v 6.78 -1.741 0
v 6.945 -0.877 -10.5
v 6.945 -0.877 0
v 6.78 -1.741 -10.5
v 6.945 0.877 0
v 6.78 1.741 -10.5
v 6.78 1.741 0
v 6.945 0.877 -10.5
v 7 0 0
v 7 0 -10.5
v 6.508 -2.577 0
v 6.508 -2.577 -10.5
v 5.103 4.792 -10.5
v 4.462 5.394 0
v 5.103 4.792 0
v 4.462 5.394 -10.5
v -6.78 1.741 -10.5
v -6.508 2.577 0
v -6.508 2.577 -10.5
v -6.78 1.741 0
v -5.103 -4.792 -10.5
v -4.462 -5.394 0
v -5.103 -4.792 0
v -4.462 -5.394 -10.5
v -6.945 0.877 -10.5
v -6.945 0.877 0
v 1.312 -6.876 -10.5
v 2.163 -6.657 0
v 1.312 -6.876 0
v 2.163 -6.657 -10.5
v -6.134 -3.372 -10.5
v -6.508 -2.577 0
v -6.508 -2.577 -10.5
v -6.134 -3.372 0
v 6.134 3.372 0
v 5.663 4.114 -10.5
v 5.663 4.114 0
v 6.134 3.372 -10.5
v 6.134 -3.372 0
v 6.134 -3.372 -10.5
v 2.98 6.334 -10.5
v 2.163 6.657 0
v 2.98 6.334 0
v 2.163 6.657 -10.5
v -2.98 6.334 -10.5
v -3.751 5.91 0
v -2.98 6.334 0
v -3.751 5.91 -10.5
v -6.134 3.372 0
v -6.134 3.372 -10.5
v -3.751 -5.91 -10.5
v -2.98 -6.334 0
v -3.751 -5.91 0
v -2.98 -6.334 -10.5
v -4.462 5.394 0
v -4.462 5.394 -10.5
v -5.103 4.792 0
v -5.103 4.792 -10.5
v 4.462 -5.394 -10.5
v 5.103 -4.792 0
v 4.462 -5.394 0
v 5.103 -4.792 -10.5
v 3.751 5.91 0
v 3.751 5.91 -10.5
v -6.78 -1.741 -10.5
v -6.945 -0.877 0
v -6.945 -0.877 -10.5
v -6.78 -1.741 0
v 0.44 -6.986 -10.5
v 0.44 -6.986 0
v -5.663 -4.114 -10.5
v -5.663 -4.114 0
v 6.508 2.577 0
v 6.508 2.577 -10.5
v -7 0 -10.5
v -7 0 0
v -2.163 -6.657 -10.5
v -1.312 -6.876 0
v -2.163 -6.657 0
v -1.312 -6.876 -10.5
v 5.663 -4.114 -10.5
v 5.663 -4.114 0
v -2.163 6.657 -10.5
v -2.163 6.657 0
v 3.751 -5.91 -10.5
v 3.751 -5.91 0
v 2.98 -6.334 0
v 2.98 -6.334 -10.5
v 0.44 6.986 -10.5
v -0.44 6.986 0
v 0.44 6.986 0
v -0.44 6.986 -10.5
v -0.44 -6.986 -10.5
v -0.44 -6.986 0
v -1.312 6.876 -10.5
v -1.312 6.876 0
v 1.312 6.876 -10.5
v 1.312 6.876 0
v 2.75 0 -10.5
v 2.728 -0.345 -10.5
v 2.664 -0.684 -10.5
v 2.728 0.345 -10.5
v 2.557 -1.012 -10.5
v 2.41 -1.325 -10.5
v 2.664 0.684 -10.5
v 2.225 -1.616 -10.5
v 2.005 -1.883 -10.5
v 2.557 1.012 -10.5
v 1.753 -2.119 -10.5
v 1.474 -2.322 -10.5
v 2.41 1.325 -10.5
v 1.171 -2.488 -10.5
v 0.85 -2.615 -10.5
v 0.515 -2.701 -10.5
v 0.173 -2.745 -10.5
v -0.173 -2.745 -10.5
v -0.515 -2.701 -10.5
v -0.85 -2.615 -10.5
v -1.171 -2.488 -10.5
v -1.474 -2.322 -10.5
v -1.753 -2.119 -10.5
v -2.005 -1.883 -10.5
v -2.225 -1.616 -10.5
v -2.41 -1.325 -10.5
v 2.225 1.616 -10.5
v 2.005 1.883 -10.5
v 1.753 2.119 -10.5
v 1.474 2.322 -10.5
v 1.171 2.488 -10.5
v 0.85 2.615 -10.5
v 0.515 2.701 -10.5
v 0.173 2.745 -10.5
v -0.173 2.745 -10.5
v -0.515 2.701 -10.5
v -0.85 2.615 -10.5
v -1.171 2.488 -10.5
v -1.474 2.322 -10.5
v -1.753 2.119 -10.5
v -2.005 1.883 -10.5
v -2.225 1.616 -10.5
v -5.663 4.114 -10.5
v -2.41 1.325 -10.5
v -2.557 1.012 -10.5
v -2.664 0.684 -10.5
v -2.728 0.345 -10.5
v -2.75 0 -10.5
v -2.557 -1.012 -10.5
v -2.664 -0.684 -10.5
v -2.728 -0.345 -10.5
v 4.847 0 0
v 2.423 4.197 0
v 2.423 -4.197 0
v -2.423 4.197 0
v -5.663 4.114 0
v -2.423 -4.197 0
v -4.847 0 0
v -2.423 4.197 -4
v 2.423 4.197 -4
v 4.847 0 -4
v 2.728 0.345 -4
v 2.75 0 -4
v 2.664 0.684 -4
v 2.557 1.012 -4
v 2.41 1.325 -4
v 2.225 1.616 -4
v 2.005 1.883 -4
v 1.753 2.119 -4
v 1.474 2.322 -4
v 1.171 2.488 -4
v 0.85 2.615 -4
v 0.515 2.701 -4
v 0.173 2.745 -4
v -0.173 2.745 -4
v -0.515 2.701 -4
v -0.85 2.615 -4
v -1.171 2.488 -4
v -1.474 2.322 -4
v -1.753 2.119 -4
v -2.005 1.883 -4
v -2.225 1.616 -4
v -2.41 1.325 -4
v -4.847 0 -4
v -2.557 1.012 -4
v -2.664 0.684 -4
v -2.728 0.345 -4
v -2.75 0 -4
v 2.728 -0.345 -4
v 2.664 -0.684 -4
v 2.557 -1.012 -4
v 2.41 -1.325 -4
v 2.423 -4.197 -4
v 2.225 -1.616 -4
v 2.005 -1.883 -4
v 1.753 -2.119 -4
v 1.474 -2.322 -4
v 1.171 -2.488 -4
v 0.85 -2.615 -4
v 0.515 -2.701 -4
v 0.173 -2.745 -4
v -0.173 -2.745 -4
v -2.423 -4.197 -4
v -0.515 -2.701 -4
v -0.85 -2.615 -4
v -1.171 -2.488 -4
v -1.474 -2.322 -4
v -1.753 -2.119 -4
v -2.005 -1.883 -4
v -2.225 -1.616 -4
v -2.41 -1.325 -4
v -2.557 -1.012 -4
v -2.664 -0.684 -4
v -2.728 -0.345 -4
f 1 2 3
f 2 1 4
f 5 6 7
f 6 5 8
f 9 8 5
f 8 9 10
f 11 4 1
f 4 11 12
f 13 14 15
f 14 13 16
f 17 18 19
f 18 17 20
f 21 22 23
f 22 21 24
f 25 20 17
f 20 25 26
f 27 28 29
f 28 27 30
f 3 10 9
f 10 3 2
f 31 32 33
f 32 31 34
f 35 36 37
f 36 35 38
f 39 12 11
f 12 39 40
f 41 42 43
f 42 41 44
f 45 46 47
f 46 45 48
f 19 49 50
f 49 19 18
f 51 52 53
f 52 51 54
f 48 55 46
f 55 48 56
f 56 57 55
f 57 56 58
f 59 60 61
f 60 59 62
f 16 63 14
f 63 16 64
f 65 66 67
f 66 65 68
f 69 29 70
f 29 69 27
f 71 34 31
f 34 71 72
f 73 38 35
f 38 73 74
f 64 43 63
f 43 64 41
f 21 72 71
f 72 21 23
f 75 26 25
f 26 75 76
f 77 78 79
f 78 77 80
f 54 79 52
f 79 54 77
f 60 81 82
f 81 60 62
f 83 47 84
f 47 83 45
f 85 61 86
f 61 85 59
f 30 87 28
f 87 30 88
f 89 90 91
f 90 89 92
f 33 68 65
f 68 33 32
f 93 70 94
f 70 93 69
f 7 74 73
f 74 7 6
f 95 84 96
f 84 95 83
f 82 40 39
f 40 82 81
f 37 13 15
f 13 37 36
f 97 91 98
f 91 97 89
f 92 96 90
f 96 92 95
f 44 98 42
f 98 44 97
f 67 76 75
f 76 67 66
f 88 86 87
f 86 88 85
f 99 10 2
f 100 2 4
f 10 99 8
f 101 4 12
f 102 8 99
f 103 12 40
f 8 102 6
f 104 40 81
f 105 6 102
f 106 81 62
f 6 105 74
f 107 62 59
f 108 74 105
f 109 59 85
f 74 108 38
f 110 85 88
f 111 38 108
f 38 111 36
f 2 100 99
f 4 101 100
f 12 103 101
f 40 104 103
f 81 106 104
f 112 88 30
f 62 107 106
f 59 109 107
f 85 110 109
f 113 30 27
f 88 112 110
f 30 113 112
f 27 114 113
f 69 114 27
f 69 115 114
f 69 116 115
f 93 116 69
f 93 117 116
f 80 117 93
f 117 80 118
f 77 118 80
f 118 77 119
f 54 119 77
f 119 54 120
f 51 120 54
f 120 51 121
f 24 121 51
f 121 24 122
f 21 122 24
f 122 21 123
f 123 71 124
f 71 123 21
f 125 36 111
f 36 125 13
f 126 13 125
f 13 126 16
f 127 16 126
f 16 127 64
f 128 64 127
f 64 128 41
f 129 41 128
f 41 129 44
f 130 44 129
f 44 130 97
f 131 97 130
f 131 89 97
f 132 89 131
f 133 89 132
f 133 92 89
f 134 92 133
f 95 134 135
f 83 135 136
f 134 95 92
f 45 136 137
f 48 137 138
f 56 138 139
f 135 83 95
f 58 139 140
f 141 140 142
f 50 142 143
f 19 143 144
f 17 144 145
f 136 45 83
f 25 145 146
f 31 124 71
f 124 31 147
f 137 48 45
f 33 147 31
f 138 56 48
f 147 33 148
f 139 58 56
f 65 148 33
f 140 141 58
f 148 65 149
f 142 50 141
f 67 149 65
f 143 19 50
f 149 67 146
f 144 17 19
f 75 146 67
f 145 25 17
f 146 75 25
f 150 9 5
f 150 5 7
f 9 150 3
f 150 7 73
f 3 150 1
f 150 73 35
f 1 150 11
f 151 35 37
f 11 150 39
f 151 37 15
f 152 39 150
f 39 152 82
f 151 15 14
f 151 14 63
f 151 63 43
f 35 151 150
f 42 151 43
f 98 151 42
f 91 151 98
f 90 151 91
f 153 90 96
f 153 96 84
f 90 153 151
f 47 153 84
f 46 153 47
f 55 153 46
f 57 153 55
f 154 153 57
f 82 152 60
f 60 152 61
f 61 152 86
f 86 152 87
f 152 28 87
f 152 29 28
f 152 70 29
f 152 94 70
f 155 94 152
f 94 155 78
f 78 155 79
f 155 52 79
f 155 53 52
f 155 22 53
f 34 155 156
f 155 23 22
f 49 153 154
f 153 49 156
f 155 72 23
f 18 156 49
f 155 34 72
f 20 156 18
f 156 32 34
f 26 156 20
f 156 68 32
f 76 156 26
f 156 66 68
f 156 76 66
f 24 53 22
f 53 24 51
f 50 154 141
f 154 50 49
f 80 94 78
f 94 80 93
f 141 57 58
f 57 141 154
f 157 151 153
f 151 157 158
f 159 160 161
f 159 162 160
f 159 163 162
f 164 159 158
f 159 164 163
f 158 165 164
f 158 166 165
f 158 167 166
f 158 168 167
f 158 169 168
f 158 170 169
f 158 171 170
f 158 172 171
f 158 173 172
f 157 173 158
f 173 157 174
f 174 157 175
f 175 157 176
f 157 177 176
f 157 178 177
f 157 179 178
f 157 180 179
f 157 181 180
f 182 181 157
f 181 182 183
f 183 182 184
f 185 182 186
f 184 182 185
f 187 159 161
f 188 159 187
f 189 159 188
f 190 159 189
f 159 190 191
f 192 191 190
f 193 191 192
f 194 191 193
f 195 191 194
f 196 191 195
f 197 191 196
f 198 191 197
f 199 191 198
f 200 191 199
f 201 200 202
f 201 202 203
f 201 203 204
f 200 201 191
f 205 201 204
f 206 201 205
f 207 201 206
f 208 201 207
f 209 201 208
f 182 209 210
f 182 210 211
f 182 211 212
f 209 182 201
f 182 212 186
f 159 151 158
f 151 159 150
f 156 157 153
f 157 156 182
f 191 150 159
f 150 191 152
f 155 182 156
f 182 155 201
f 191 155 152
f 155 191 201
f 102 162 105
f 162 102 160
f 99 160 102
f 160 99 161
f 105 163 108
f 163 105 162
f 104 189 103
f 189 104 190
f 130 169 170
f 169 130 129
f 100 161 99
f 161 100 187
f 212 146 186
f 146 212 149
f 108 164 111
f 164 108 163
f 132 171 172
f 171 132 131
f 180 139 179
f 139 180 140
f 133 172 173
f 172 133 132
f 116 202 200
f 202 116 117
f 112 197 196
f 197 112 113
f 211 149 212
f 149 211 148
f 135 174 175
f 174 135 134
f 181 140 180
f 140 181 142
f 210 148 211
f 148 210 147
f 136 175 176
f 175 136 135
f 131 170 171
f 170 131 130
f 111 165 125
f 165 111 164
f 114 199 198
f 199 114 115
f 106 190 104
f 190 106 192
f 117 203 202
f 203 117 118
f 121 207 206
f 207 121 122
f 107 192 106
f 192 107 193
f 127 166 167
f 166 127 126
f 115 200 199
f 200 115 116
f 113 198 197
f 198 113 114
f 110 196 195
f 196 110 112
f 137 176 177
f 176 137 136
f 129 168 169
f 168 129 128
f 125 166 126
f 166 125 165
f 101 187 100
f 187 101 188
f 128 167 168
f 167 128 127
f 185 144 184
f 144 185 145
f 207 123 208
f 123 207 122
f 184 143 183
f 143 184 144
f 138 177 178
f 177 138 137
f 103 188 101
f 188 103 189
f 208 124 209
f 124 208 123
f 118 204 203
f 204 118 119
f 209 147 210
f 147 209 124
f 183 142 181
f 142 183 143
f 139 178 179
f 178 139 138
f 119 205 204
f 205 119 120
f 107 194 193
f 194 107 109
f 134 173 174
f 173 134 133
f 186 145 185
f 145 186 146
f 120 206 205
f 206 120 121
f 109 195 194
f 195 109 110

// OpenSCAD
$fn = 50;


difference() {
	union() {
		translate(v = [0, 0, -10.5000000000]) {
			cylinder(h = 10.5000000000, r = 7.0000000000);
		}
		translate(v = [0, 0, -9.0000000000]) {
			cylinder(h = 9, r = 2.8750000000);
		}
	}
	union() {
		translate(v = [0, 0, 0]) {
			rotate(a = [0, 0, 0]) {
				difference() {
					union() {
						translate(v = [0, 0, -4]) {
							linear_extrude(height = 4) {
								polygon(points = [[4.8468000000, 0.0000000000], [2.4234000000, 4.1974519271], [-2.4234000000, 4.1974519271], [-4.8468000000, 0.0000000000], [-2.4234000000, -4.1974519271], [2.4234000000, -4.1974519271]]);
							}
						}
					}
					union();
				}
			}
		}
		#translate(v = [0, 0, -100.0000000000]) {
			cylinder(h = 200, r = 2.7500000000);
		}
	}
}
